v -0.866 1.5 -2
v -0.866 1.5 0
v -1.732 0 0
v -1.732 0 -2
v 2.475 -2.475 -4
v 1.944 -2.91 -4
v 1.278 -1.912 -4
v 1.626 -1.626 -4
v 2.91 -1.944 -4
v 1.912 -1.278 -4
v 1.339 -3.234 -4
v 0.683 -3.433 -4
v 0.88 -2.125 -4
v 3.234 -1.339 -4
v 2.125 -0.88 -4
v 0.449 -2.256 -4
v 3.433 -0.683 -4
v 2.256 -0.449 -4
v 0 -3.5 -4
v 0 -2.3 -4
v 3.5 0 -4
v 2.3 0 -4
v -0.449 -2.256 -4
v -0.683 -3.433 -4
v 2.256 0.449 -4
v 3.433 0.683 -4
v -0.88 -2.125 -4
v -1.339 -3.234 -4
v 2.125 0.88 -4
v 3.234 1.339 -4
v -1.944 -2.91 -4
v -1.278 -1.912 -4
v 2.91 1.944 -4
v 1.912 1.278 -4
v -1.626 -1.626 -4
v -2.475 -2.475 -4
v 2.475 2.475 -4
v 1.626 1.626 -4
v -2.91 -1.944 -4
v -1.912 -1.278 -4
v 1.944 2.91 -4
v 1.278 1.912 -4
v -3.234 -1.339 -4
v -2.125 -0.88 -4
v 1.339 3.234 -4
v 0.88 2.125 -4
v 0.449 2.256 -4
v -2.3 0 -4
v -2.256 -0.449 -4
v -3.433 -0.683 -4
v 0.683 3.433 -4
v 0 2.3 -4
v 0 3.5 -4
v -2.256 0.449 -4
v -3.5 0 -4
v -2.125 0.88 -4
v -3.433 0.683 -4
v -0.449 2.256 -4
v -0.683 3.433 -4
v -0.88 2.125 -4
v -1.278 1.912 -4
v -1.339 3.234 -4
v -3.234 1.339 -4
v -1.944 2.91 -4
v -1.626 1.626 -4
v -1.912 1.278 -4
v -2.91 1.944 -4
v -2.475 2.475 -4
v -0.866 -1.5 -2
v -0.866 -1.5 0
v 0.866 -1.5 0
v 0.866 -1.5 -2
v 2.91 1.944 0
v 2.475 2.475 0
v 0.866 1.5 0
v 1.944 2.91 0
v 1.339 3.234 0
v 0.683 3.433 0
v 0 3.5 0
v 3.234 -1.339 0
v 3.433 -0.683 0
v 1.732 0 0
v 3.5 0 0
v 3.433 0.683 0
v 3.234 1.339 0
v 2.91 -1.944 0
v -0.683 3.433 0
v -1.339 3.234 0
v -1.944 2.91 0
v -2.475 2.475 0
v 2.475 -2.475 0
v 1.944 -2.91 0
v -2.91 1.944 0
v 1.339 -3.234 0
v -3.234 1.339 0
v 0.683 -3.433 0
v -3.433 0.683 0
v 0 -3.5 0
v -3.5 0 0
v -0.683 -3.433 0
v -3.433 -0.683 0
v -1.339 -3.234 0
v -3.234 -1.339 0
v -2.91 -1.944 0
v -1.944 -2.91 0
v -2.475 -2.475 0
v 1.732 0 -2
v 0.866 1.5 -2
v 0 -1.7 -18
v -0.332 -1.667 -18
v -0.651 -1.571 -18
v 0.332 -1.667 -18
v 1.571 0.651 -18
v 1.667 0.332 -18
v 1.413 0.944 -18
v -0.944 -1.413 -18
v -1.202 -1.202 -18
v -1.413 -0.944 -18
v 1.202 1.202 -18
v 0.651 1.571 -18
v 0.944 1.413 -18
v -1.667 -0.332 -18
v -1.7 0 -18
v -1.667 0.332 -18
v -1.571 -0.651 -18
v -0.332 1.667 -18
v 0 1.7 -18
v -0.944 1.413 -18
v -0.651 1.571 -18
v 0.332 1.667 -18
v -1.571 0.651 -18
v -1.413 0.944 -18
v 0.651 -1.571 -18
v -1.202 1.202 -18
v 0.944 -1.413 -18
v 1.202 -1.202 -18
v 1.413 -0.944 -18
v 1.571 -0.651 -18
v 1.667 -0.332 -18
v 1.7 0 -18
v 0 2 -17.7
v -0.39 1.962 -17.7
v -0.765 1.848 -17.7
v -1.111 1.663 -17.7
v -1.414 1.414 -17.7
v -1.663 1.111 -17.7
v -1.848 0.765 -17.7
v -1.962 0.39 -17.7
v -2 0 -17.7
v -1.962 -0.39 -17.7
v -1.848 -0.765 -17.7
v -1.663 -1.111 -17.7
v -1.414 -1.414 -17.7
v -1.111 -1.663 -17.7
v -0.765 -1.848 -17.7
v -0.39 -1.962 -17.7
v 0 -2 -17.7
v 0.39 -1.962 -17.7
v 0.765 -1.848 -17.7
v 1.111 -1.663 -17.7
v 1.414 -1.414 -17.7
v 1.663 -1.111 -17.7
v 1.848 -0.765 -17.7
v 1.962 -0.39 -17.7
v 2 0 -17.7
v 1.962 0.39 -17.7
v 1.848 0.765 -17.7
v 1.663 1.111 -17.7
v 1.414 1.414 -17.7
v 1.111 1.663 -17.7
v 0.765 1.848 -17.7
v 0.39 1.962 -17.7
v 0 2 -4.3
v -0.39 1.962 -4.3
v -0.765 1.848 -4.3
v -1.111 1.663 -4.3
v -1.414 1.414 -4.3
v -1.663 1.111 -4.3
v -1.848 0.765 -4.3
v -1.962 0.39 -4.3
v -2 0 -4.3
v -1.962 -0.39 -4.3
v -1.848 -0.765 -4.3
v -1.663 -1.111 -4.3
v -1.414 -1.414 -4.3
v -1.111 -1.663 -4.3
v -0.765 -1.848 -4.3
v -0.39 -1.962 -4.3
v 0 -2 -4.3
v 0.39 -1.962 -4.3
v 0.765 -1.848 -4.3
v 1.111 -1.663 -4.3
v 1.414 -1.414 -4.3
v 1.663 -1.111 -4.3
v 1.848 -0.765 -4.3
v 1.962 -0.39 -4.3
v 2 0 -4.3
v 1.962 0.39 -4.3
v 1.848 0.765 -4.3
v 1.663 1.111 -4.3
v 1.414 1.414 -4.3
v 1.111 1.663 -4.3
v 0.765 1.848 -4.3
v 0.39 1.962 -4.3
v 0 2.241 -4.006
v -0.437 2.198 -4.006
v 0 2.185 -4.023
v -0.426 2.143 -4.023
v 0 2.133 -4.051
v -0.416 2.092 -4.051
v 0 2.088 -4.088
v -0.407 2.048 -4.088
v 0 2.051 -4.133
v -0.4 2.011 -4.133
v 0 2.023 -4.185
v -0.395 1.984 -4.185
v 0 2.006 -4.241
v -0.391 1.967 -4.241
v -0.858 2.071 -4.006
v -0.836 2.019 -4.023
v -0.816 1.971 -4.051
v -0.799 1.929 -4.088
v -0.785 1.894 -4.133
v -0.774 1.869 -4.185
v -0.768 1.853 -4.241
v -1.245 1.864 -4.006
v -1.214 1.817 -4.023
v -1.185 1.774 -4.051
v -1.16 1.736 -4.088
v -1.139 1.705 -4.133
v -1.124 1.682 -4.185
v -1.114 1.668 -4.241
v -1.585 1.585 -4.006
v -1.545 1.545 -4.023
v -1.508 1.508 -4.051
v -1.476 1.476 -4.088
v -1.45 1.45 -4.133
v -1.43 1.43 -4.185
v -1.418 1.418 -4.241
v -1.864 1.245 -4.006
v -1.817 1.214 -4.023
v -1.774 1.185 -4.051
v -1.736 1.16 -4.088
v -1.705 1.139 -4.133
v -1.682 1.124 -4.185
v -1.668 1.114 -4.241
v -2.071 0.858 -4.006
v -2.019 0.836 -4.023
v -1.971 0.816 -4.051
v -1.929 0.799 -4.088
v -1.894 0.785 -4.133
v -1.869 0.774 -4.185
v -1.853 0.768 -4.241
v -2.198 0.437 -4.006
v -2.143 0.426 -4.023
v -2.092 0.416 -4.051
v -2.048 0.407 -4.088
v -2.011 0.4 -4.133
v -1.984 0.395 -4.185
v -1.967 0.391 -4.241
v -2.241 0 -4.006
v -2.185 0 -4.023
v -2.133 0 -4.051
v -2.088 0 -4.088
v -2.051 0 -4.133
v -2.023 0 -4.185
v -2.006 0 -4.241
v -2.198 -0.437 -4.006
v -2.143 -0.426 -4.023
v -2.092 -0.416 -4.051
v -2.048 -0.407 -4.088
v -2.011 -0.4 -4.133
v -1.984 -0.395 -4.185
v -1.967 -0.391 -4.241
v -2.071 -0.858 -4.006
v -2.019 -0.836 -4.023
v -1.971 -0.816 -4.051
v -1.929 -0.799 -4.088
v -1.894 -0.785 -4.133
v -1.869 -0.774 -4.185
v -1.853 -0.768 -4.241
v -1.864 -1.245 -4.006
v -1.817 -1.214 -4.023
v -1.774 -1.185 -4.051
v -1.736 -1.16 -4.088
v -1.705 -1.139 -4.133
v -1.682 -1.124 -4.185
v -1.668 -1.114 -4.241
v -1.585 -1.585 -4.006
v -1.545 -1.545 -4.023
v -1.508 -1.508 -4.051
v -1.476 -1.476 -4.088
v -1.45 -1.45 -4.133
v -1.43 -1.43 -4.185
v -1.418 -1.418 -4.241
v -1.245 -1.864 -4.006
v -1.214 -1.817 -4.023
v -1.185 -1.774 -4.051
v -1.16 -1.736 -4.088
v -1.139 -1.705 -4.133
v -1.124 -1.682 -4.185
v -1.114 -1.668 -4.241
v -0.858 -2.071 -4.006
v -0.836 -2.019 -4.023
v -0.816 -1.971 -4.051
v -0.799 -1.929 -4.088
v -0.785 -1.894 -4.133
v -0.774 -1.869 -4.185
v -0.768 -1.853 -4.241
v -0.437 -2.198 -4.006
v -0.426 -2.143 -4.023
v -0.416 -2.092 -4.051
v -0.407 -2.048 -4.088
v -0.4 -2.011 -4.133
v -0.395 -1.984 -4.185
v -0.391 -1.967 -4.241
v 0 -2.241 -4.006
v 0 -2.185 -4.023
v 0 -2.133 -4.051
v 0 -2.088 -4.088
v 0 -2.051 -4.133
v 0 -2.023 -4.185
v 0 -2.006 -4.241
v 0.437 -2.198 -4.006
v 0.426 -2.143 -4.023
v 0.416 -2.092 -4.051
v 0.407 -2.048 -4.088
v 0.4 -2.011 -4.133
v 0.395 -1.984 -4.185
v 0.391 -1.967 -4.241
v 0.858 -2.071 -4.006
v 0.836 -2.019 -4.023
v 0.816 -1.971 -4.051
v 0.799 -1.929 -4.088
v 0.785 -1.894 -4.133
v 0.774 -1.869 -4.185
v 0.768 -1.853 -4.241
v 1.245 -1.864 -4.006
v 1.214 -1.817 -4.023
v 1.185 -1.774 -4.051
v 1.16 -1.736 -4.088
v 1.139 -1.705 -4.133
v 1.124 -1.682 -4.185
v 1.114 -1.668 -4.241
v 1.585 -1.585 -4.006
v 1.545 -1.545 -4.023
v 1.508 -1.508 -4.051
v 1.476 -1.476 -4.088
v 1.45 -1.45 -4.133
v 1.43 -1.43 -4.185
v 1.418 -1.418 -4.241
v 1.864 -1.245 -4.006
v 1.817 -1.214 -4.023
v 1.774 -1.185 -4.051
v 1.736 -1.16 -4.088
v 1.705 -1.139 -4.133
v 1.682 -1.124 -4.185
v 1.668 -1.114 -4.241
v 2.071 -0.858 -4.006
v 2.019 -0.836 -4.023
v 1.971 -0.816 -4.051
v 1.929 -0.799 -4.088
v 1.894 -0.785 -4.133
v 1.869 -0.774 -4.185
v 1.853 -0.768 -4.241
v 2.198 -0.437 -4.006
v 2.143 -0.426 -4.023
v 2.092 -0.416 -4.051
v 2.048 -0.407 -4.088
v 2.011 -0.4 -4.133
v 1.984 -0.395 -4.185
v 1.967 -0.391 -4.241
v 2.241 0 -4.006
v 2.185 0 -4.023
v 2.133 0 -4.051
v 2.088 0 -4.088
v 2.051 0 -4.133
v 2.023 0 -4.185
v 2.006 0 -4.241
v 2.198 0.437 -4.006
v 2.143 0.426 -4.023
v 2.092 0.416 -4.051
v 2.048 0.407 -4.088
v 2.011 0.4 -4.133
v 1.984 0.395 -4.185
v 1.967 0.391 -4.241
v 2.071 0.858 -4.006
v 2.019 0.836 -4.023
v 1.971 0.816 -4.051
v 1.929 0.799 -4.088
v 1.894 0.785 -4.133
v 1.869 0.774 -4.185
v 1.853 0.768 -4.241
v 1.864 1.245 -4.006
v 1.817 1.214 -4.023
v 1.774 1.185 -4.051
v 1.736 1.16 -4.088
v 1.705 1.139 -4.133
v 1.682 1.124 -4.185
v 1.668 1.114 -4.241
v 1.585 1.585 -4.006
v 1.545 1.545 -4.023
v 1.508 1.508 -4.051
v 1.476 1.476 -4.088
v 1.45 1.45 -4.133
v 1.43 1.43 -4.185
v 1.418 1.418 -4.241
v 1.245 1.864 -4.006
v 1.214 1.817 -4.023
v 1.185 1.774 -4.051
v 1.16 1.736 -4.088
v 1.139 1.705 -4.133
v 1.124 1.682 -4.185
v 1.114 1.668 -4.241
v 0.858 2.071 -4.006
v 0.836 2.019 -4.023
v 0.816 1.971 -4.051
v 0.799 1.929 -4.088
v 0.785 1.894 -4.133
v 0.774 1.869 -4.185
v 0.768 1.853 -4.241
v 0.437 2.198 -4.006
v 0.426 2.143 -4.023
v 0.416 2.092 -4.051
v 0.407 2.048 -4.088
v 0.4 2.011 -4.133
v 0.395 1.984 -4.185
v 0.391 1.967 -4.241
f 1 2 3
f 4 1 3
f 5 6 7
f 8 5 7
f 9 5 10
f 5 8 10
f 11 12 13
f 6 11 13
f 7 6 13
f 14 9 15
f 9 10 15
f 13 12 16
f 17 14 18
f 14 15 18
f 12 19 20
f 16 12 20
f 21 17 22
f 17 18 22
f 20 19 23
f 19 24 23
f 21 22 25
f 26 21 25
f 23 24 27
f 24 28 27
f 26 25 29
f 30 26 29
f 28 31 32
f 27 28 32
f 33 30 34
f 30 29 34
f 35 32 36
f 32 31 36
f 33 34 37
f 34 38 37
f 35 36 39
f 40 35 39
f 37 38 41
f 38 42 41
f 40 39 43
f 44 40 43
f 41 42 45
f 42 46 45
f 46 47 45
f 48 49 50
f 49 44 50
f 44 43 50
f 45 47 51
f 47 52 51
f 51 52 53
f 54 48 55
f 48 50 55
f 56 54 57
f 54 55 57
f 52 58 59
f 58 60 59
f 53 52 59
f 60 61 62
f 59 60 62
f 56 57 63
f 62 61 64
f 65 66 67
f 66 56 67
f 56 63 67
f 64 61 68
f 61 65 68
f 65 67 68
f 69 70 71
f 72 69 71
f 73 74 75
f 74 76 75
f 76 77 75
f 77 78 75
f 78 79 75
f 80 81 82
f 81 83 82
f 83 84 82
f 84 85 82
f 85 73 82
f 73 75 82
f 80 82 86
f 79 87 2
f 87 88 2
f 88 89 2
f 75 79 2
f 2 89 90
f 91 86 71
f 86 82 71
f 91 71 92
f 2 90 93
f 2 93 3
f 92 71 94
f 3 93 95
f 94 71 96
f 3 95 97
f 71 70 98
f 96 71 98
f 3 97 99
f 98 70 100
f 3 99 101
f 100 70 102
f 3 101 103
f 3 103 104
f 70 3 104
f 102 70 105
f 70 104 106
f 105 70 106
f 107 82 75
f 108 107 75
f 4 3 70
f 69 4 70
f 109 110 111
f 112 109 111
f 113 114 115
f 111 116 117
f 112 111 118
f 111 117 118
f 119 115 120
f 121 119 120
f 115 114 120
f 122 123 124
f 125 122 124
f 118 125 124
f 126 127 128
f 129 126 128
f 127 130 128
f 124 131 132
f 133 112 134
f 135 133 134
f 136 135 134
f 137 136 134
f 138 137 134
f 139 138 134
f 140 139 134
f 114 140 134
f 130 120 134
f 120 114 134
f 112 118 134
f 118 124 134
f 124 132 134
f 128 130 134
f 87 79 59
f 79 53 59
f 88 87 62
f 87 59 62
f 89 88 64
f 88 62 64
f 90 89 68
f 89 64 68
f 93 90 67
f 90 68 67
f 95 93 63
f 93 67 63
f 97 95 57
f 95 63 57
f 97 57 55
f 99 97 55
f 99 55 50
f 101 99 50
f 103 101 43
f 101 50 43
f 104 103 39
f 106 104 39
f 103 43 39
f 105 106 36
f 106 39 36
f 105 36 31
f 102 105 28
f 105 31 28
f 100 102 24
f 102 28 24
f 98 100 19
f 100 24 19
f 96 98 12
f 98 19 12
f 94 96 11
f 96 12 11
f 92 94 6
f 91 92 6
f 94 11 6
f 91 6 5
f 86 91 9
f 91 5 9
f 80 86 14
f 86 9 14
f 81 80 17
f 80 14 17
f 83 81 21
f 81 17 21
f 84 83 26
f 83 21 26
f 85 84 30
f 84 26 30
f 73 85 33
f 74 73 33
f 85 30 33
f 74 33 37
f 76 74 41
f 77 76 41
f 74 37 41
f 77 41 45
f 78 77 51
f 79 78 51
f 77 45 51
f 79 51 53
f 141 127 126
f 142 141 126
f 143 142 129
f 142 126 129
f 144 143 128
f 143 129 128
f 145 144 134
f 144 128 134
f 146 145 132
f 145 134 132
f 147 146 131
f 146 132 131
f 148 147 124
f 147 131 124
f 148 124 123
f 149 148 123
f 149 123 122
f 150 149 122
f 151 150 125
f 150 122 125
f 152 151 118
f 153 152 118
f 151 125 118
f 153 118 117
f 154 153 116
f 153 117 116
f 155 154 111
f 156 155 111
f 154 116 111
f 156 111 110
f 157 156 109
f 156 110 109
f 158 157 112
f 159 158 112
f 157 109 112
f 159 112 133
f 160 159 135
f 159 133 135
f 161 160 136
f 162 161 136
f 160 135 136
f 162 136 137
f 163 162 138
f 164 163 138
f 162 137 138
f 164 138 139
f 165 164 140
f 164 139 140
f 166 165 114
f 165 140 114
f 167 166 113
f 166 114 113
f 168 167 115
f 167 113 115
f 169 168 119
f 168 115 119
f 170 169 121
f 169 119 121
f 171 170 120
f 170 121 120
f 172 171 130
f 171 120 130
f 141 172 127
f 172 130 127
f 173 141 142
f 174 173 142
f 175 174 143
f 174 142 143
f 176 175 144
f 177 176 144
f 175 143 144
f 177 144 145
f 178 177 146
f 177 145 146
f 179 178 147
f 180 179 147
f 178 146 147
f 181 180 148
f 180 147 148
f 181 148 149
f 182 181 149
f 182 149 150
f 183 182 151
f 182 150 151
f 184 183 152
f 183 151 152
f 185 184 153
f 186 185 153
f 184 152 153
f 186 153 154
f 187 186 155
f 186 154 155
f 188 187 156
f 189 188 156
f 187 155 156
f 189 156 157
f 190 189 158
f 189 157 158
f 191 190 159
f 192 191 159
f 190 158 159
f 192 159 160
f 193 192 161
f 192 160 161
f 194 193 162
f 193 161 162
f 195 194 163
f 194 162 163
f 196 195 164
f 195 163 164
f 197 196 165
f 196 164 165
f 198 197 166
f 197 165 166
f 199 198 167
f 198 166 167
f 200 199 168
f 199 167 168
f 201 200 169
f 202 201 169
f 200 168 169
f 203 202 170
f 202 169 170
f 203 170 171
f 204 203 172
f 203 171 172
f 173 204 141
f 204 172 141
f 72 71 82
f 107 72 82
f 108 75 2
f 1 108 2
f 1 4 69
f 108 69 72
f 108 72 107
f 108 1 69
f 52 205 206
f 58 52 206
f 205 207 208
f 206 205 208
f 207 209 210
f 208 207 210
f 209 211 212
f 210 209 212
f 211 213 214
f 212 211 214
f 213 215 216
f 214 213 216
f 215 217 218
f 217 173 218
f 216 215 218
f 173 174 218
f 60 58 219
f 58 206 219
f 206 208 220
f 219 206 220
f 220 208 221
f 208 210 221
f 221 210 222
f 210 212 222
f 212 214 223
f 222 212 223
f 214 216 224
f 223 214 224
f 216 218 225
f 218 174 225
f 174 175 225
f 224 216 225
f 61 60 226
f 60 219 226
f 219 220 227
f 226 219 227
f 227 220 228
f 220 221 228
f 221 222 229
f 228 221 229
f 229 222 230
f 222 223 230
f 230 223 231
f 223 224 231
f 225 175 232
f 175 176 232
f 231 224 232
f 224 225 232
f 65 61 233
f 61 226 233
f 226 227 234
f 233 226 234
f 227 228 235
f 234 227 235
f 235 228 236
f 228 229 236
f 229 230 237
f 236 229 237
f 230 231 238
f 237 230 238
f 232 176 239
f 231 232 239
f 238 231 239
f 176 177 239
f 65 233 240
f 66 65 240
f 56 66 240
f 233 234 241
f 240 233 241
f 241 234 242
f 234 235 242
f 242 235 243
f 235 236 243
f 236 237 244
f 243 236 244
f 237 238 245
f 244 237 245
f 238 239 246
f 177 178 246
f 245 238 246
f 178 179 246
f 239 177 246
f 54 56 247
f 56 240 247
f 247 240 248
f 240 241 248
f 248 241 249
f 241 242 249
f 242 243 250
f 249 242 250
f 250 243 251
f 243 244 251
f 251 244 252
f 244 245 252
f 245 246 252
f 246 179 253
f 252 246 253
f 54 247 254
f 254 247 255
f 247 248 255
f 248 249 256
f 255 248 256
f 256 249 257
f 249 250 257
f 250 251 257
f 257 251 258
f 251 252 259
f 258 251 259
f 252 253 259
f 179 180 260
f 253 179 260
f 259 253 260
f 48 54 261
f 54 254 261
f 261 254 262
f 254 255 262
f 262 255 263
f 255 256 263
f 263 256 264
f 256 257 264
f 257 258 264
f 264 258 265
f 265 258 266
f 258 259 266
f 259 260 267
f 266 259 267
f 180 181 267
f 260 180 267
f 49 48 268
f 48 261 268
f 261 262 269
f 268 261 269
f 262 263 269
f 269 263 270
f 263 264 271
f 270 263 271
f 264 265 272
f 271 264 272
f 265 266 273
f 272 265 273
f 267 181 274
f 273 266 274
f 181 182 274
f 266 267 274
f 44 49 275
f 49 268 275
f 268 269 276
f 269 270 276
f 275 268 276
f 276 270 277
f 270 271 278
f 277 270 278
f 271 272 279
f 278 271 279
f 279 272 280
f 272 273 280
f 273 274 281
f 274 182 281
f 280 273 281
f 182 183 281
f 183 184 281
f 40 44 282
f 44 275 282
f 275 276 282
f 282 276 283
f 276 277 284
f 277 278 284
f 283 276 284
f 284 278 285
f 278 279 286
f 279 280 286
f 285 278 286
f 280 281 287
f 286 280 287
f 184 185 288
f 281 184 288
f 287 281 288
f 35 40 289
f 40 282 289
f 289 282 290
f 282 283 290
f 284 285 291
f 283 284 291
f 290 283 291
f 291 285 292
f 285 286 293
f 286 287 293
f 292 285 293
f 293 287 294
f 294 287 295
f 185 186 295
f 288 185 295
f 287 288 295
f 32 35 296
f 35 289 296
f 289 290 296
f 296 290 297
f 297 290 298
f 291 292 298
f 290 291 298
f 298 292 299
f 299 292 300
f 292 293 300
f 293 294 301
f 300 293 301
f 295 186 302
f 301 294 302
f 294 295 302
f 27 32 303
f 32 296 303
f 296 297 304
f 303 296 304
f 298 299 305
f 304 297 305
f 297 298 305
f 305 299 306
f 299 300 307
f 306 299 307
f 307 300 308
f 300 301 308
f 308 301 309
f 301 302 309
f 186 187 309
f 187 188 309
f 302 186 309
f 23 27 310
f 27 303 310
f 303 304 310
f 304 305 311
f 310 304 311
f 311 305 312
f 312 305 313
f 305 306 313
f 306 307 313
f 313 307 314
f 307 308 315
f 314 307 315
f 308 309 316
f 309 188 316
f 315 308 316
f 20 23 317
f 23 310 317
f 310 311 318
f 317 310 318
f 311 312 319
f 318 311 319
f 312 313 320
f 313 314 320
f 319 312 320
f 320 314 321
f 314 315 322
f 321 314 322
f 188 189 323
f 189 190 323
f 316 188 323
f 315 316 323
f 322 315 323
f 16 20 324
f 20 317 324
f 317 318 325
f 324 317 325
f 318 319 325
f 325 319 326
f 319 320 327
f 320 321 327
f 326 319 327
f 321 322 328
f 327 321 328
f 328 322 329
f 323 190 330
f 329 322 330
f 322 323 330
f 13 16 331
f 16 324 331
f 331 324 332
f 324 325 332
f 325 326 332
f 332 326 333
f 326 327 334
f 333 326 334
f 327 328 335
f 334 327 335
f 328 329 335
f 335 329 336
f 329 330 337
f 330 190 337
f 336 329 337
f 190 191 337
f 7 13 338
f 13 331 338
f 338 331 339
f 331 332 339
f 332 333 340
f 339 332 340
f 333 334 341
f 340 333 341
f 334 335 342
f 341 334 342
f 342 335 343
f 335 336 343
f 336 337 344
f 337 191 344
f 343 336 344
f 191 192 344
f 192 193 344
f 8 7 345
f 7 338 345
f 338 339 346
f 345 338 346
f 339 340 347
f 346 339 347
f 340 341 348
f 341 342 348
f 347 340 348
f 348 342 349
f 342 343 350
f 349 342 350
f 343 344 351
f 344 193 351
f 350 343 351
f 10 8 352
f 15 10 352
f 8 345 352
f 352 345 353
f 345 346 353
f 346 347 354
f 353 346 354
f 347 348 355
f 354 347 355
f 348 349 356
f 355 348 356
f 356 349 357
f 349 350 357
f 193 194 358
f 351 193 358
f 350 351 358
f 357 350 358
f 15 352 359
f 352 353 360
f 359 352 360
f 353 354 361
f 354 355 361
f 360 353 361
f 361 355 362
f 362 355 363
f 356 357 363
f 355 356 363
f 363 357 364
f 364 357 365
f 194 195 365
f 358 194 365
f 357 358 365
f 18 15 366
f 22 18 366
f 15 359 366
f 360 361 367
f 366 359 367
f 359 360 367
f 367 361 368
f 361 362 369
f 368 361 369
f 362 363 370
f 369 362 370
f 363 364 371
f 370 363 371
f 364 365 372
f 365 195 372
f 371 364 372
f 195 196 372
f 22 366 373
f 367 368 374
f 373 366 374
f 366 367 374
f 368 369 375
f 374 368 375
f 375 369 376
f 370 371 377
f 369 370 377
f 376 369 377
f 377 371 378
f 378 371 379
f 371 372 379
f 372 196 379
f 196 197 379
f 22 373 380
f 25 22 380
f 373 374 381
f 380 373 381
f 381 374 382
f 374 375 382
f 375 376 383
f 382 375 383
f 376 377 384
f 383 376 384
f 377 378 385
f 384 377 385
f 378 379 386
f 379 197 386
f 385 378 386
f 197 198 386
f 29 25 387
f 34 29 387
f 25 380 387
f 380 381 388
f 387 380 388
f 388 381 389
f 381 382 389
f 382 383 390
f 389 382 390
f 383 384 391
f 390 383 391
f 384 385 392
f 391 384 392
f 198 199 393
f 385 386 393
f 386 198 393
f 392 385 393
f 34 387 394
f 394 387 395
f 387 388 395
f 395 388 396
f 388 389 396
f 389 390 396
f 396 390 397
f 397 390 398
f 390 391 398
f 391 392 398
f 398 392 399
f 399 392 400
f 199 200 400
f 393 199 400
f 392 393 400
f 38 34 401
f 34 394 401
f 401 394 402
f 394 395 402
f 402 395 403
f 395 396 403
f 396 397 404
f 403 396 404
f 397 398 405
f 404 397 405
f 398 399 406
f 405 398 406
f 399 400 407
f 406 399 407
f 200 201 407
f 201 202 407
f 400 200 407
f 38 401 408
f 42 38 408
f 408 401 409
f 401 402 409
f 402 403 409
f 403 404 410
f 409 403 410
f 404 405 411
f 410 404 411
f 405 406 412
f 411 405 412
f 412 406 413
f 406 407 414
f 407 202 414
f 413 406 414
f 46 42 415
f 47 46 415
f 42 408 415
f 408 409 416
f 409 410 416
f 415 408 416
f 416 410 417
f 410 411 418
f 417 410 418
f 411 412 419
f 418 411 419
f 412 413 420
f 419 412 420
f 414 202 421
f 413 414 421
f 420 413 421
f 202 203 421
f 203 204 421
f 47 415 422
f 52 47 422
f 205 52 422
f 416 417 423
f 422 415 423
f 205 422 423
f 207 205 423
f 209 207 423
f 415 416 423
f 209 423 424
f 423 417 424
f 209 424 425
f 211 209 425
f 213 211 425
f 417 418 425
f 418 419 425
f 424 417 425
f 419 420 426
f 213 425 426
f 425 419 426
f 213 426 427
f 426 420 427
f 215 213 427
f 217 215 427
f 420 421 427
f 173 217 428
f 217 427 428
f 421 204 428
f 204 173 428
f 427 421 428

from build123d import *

# Parameters (mm, degrees)
CUT_EXTRUDE_1_DEPTH = 2
FILLET_1_R          = 0.3
CHAMFER_1_SIZE      = 0.3


with BuildPart() as part:
    # Эскиз1 → Повернуть1 (revolve)
    with BuildSketch(Plane(origin=(0, 0, 0), x_dir=(0, 0, -1), z_dir=(1, 0, 0))):
        Polygon((0, 0), (0, 3.5), (4, 3.5), (4, 2), (18, 2), (18, 0), align=None)
    revolve(axis=Axis((0, 0, 0), (0, 0, 1)))

    # Эскиз2 → Вырез-Вытянуть1 (cut)
    with BuildSketch(Plane.XY):
        Polygon((1.732050808, 0), (0.866025404, 1.5), (-0.866025404, 1.5), (-1.732050808, 0), (-0.866025404, -1.5), (0.866025404, -1.5), align=None)
    extrude(amount=-CUT_EXTRUDE_1_DEPTH, mode=Mode.SUBTRACT)

    # Скругление1
    fillet_1_edges = [part.edges().sort_by_distance(p)[0] for p in [
        (0, -2, -4),
    ]]
    fillet(fillet_1_edges, radius=FILLET_1_R)

    # Фаска1
    chamfer_1_edges = [part.edges().sort_by_distance(p)[0] for p in [
        (0, -2, -18),
    ]]
    chamfer(chamfer_1_edges, length=CHAMFER_1_SIZE)


solid = part.part
